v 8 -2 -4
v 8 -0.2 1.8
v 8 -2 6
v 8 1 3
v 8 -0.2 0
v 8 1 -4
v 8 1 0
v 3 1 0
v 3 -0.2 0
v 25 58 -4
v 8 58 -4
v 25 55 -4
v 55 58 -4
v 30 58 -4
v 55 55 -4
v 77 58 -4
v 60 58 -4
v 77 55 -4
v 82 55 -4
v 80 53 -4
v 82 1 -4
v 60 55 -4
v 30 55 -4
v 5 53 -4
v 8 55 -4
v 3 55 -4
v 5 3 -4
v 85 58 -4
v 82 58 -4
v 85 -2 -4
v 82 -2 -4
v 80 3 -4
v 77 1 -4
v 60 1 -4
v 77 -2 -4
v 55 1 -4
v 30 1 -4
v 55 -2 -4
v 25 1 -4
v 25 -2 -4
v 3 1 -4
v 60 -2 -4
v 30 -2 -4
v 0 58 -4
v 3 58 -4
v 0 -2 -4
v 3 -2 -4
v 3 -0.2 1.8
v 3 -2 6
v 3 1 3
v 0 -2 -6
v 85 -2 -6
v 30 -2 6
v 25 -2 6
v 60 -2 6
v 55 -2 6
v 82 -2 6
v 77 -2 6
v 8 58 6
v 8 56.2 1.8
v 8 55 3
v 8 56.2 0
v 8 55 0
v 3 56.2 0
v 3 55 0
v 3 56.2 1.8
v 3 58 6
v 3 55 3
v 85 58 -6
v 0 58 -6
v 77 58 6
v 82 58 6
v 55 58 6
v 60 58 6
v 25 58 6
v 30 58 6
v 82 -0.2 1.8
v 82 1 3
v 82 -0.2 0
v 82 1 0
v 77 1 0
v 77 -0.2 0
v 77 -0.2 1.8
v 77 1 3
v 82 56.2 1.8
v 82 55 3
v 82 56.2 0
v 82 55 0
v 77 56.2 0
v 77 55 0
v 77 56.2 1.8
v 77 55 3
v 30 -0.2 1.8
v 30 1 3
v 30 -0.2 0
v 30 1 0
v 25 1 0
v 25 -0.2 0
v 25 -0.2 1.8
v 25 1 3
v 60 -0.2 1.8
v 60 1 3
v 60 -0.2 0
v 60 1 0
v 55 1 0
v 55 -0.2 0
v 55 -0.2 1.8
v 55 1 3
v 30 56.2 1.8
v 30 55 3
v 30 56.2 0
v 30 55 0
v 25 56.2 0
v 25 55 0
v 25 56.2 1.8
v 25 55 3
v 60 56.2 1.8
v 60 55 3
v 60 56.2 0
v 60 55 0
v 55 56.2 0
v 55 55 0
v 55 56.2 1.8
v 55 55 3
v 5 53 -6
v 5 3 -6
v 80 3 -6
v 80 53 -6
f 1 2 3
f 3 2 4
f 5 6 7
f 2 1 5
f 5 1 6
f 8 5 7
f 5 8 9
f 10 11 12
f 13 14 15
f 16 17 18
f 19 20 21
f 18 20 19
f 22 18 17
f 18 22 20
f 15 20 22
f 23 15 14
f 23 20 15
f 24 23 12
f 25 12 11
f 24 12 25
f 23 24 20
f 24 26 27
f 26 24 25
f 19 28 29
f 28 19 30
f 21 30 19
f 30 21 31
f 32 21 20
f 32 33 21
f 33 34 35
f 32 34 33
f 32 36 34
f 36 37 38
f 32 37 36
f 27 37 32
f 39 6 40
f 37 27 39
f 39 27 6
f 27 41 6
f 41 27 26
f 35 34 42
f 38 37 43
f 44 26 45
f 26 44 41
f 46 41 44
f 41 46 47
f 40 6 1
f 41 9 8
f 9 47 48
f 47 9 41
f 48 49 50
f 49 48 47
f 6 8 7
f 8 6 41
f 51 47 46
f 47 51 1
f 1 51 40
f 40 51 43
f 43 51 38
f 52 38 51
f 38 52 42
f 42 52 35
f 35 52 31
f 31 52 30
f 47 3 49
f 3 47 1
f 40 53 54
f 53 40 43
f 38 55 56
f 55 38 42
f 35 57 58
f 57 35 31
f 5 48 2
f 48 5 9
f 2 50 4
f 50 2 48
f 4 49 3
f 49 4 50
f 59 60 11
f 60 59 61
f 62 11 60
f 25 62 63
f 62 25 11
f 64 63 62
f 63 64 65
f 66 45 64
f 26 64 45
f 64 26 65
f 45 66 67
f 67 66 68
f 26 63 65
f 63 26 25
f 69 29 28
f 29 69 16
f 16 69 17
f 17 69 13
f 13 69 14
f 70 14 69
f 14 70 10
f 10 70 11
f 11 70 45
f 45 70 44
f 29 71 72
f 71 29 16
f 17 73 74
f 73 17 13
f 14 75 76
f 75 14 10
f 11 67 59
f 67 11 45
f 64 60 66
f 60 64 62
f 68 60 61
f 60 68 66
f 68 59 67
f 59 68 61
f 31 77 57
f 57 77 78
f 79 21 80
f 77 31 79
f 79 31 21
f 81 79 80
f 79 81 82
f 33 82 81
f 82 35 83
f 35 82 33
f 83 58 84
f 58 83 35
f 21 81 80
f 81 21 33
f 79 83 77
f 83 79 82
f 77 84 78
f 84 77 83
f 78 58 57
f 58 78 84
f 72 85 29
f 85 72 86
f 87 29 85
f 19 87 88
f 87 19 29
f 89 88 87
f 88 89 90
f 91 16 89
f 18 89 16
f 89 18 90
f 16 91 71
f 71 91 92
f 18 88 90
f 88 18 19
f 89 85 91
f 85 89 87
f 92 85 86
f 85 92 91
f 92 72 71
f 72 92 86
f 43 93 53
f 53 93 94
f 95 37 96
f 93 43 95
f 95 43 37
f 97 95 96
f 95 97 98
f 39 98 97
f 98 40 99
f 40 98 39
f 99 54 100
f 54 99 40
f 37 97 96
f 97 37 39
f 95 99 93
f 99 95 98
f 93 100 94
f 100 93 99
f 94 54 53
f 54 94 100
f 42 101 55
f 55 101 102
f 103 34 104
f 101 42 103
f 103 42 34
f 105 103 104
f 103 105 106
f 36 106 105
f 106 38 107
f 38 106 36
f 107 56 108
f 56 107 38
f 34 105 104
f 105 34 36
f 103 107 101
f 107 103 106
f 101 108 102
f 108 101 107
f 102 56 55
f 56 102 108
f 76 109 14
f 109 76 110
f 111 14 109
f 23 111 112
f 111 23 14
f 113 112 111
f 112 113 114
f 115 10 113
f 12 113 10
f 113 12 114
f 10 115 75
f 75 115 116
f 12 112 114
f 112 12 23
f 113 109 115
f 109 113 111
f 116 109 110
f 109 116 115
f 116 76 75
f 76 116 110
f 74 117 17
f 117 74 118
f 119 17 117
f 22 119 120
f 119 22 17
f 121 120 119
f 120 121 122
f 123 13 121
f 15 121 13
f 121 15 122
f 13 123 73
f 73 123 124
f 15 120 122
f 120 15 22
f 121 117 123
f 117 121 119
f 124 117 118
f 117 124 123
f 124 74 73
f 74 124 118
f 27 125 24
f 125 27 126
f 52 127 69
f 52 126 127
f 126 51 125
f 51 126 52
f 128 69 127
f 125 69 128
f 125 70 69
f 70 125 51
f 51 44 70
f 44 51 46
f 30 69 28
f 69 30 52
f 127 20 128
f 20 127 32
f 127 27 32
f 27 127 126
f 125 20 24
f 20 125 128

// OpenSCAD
small = 0.1;
peg_bite  =  1.0;
bite_extra = 0.2;  // extra clearance for edge of board
peg_gap   =  2.0;
peg_width =  5.0;
peg_depth =  3.0;
peg_sep   =  56 - 2;
peg_raise =  4.0;

board_x = 85.0;
board_y = 56.0;
board_z =  1.1;

//   _
//  | \
//  |  \
//  |   \
//  |  /
//  |  |
//  |  o-|  <- origin
//  |    |
//  |    |
//  ------
module peg()
{
  extra = 1;

  translate([0, -peg_depth+peg_bite,-peg_raise])
  {
    cube([peg_width,peg_depth,peg_raise], center=false);
  }

  translate([0, -peg_depth+peg_bite,0])
  {
    cube([peg_width,peg_depth-peg_bite-bite_extra,peg_gap+peg_bite+peg_bite], center=false);
  }

  translate([0,-peg_depth+peg_bite+extra-extra,peg_gap])
  {
    //cube([peg_width,peg_depth-peg_bite-extra,peg_bite+extra], center=false);
  }

  peg_dxy = peg_depth;
  polyhedron(
    points = [
      [0, peg_bite, peg_gap+peg_bite],
      [0, peg_bite-peg_dxy, peg_gap+peg_bite-peg_dxy],
      [0, peg_bite-peg_dxy, peg_gap+peg_bite+peg_dxy],
      [peg_width, peg_bite, peg_gap+peg_bite],
      [peg_width, peg_bite-peg_dxy, peg_gap+peg_bite-peg_dxy],
      [peg_width, peg_bite-peg_dxy, peg_gap+peg_bite+peg_dxy],
    ],
    triangles = [ 
      [0,2,1],  // right
      [3,4,5],  // left
      [0,3,2],  // top
      [2,3,5],
      [1,2,4],  // back
      [4,2,5],
      [0,1,3],  // bottom
      [3,1,4]
    ]
  );
}

module front_peg(x)
{
  translate([x,0,0]) 
  {
    peg();
  }
}

module back_peg(x)
{
  translate([x,board_y,0])
  {
    mirror([0,1,0])
    {
      peg();
    }
  }
}


module board()
{
  color([0,1,0]) {
    cube([board_x,board_y,board_z],center=false);
  }
  // ethernet block
  large = 10;
  translate([-1,38,board_z]) 
  {
    cube([21,16.5,14.0]);
    translate([-10.0+small,0,0]) cube([10.0,16.5,14]);  // clearance volume - keep clear
    translate([-10.0,0,0]) cube([10.0+large,16.5,15+2]);  // extra clearance above to height of usb
  }

  // usb block
  translate([0,18,board_z]) 
  {
    translate([-7.5,0,1]) cube([18,14,16]);
    translate([-3,2,0]) cube([13,10,1+small]);
  }

  // hdmi block
  translate([board_x-5.0,44.0,board_z])
  {
    cube([6.0,9.0,4.0]);
    translate([6.0-small,0,0]) cube([10.0,9.0,4.0]);  // clearance volume - keep clear
  }

  // SD Card clearance
  translate([board_x-small,14.0,-3.5])
  {
    difference()
    {
      cube([17.0+small, 25.0, 3.0]);  // clearance volume - keep clear
      //translate([-small,10.0,-small]) cube([17.0+small*3,5.0,3+small*2]);
    }
  }

  // audio connector
  translate([13.5, 0, 4.4]) {
    cube([12.0,11.0, 6.5]);
    translate([6.0,0.0,3.25]) rotate([90,0,0]) cylinder(h=4, r=6.5/2);
    translate([6.0,-4+small,3.25]) rotate([90,0,0]) cylinder(h=10, r=6.5/2);  // clearance volume
  }

  // video connector
  translate([33.0,3.0,board_z]) {
    cube([10.0,10.0,13.0]);
    translate([5,0,7.5]) rotate([90,0,0]) cylinder(h=9,r=8.5/2);
    translate([5,0,7.5]) rotate([90,0,0]) cylinder(h=19,r=10.0/2);
  }
}

module pair()
{
  foot_height = 2.0;
  foot_x = peg_width;
  foot_y = board_y + (peg_depth-peg_bite) * 2;
  translate([0,-peg_depth+peg_bite,-peg_raise-foot_height])
  {
    cube([foot_x,foot_y,foot_height],center=false);
  }
}

module pibase()
{
  front_peg(3.0);
  back_peg(3.0);
  front_peg(board_x-peg_width-3.0);
  back_peg(board_x-peg_width-3.0);

  pair();
  translate([board_x-peg_width,0,0])
  {
    pair();
  }

  // more pegs

  front_peg(25.0);
  front_peg(board_x-25.0-peg_width);
  back_peg(25.0);
  back_peg(board_x-25.0-peg_width);


  peg3_offet = 25.0;
  
  
  spar_width = peg_width;
  spar_height = 2.0;
  translate([0,-peg_depth+peg_bite,-peg_raise-spar_height]) {
    cube([board_x, spar_width, spar_height]);
  }
  translate([0,board_y-spar_width+peg_depth-peg_bite,-peg_raise-spar_height]) {
    cube([board_x, spar_width, spar_height]);
  }
}

pibase();
%board();
